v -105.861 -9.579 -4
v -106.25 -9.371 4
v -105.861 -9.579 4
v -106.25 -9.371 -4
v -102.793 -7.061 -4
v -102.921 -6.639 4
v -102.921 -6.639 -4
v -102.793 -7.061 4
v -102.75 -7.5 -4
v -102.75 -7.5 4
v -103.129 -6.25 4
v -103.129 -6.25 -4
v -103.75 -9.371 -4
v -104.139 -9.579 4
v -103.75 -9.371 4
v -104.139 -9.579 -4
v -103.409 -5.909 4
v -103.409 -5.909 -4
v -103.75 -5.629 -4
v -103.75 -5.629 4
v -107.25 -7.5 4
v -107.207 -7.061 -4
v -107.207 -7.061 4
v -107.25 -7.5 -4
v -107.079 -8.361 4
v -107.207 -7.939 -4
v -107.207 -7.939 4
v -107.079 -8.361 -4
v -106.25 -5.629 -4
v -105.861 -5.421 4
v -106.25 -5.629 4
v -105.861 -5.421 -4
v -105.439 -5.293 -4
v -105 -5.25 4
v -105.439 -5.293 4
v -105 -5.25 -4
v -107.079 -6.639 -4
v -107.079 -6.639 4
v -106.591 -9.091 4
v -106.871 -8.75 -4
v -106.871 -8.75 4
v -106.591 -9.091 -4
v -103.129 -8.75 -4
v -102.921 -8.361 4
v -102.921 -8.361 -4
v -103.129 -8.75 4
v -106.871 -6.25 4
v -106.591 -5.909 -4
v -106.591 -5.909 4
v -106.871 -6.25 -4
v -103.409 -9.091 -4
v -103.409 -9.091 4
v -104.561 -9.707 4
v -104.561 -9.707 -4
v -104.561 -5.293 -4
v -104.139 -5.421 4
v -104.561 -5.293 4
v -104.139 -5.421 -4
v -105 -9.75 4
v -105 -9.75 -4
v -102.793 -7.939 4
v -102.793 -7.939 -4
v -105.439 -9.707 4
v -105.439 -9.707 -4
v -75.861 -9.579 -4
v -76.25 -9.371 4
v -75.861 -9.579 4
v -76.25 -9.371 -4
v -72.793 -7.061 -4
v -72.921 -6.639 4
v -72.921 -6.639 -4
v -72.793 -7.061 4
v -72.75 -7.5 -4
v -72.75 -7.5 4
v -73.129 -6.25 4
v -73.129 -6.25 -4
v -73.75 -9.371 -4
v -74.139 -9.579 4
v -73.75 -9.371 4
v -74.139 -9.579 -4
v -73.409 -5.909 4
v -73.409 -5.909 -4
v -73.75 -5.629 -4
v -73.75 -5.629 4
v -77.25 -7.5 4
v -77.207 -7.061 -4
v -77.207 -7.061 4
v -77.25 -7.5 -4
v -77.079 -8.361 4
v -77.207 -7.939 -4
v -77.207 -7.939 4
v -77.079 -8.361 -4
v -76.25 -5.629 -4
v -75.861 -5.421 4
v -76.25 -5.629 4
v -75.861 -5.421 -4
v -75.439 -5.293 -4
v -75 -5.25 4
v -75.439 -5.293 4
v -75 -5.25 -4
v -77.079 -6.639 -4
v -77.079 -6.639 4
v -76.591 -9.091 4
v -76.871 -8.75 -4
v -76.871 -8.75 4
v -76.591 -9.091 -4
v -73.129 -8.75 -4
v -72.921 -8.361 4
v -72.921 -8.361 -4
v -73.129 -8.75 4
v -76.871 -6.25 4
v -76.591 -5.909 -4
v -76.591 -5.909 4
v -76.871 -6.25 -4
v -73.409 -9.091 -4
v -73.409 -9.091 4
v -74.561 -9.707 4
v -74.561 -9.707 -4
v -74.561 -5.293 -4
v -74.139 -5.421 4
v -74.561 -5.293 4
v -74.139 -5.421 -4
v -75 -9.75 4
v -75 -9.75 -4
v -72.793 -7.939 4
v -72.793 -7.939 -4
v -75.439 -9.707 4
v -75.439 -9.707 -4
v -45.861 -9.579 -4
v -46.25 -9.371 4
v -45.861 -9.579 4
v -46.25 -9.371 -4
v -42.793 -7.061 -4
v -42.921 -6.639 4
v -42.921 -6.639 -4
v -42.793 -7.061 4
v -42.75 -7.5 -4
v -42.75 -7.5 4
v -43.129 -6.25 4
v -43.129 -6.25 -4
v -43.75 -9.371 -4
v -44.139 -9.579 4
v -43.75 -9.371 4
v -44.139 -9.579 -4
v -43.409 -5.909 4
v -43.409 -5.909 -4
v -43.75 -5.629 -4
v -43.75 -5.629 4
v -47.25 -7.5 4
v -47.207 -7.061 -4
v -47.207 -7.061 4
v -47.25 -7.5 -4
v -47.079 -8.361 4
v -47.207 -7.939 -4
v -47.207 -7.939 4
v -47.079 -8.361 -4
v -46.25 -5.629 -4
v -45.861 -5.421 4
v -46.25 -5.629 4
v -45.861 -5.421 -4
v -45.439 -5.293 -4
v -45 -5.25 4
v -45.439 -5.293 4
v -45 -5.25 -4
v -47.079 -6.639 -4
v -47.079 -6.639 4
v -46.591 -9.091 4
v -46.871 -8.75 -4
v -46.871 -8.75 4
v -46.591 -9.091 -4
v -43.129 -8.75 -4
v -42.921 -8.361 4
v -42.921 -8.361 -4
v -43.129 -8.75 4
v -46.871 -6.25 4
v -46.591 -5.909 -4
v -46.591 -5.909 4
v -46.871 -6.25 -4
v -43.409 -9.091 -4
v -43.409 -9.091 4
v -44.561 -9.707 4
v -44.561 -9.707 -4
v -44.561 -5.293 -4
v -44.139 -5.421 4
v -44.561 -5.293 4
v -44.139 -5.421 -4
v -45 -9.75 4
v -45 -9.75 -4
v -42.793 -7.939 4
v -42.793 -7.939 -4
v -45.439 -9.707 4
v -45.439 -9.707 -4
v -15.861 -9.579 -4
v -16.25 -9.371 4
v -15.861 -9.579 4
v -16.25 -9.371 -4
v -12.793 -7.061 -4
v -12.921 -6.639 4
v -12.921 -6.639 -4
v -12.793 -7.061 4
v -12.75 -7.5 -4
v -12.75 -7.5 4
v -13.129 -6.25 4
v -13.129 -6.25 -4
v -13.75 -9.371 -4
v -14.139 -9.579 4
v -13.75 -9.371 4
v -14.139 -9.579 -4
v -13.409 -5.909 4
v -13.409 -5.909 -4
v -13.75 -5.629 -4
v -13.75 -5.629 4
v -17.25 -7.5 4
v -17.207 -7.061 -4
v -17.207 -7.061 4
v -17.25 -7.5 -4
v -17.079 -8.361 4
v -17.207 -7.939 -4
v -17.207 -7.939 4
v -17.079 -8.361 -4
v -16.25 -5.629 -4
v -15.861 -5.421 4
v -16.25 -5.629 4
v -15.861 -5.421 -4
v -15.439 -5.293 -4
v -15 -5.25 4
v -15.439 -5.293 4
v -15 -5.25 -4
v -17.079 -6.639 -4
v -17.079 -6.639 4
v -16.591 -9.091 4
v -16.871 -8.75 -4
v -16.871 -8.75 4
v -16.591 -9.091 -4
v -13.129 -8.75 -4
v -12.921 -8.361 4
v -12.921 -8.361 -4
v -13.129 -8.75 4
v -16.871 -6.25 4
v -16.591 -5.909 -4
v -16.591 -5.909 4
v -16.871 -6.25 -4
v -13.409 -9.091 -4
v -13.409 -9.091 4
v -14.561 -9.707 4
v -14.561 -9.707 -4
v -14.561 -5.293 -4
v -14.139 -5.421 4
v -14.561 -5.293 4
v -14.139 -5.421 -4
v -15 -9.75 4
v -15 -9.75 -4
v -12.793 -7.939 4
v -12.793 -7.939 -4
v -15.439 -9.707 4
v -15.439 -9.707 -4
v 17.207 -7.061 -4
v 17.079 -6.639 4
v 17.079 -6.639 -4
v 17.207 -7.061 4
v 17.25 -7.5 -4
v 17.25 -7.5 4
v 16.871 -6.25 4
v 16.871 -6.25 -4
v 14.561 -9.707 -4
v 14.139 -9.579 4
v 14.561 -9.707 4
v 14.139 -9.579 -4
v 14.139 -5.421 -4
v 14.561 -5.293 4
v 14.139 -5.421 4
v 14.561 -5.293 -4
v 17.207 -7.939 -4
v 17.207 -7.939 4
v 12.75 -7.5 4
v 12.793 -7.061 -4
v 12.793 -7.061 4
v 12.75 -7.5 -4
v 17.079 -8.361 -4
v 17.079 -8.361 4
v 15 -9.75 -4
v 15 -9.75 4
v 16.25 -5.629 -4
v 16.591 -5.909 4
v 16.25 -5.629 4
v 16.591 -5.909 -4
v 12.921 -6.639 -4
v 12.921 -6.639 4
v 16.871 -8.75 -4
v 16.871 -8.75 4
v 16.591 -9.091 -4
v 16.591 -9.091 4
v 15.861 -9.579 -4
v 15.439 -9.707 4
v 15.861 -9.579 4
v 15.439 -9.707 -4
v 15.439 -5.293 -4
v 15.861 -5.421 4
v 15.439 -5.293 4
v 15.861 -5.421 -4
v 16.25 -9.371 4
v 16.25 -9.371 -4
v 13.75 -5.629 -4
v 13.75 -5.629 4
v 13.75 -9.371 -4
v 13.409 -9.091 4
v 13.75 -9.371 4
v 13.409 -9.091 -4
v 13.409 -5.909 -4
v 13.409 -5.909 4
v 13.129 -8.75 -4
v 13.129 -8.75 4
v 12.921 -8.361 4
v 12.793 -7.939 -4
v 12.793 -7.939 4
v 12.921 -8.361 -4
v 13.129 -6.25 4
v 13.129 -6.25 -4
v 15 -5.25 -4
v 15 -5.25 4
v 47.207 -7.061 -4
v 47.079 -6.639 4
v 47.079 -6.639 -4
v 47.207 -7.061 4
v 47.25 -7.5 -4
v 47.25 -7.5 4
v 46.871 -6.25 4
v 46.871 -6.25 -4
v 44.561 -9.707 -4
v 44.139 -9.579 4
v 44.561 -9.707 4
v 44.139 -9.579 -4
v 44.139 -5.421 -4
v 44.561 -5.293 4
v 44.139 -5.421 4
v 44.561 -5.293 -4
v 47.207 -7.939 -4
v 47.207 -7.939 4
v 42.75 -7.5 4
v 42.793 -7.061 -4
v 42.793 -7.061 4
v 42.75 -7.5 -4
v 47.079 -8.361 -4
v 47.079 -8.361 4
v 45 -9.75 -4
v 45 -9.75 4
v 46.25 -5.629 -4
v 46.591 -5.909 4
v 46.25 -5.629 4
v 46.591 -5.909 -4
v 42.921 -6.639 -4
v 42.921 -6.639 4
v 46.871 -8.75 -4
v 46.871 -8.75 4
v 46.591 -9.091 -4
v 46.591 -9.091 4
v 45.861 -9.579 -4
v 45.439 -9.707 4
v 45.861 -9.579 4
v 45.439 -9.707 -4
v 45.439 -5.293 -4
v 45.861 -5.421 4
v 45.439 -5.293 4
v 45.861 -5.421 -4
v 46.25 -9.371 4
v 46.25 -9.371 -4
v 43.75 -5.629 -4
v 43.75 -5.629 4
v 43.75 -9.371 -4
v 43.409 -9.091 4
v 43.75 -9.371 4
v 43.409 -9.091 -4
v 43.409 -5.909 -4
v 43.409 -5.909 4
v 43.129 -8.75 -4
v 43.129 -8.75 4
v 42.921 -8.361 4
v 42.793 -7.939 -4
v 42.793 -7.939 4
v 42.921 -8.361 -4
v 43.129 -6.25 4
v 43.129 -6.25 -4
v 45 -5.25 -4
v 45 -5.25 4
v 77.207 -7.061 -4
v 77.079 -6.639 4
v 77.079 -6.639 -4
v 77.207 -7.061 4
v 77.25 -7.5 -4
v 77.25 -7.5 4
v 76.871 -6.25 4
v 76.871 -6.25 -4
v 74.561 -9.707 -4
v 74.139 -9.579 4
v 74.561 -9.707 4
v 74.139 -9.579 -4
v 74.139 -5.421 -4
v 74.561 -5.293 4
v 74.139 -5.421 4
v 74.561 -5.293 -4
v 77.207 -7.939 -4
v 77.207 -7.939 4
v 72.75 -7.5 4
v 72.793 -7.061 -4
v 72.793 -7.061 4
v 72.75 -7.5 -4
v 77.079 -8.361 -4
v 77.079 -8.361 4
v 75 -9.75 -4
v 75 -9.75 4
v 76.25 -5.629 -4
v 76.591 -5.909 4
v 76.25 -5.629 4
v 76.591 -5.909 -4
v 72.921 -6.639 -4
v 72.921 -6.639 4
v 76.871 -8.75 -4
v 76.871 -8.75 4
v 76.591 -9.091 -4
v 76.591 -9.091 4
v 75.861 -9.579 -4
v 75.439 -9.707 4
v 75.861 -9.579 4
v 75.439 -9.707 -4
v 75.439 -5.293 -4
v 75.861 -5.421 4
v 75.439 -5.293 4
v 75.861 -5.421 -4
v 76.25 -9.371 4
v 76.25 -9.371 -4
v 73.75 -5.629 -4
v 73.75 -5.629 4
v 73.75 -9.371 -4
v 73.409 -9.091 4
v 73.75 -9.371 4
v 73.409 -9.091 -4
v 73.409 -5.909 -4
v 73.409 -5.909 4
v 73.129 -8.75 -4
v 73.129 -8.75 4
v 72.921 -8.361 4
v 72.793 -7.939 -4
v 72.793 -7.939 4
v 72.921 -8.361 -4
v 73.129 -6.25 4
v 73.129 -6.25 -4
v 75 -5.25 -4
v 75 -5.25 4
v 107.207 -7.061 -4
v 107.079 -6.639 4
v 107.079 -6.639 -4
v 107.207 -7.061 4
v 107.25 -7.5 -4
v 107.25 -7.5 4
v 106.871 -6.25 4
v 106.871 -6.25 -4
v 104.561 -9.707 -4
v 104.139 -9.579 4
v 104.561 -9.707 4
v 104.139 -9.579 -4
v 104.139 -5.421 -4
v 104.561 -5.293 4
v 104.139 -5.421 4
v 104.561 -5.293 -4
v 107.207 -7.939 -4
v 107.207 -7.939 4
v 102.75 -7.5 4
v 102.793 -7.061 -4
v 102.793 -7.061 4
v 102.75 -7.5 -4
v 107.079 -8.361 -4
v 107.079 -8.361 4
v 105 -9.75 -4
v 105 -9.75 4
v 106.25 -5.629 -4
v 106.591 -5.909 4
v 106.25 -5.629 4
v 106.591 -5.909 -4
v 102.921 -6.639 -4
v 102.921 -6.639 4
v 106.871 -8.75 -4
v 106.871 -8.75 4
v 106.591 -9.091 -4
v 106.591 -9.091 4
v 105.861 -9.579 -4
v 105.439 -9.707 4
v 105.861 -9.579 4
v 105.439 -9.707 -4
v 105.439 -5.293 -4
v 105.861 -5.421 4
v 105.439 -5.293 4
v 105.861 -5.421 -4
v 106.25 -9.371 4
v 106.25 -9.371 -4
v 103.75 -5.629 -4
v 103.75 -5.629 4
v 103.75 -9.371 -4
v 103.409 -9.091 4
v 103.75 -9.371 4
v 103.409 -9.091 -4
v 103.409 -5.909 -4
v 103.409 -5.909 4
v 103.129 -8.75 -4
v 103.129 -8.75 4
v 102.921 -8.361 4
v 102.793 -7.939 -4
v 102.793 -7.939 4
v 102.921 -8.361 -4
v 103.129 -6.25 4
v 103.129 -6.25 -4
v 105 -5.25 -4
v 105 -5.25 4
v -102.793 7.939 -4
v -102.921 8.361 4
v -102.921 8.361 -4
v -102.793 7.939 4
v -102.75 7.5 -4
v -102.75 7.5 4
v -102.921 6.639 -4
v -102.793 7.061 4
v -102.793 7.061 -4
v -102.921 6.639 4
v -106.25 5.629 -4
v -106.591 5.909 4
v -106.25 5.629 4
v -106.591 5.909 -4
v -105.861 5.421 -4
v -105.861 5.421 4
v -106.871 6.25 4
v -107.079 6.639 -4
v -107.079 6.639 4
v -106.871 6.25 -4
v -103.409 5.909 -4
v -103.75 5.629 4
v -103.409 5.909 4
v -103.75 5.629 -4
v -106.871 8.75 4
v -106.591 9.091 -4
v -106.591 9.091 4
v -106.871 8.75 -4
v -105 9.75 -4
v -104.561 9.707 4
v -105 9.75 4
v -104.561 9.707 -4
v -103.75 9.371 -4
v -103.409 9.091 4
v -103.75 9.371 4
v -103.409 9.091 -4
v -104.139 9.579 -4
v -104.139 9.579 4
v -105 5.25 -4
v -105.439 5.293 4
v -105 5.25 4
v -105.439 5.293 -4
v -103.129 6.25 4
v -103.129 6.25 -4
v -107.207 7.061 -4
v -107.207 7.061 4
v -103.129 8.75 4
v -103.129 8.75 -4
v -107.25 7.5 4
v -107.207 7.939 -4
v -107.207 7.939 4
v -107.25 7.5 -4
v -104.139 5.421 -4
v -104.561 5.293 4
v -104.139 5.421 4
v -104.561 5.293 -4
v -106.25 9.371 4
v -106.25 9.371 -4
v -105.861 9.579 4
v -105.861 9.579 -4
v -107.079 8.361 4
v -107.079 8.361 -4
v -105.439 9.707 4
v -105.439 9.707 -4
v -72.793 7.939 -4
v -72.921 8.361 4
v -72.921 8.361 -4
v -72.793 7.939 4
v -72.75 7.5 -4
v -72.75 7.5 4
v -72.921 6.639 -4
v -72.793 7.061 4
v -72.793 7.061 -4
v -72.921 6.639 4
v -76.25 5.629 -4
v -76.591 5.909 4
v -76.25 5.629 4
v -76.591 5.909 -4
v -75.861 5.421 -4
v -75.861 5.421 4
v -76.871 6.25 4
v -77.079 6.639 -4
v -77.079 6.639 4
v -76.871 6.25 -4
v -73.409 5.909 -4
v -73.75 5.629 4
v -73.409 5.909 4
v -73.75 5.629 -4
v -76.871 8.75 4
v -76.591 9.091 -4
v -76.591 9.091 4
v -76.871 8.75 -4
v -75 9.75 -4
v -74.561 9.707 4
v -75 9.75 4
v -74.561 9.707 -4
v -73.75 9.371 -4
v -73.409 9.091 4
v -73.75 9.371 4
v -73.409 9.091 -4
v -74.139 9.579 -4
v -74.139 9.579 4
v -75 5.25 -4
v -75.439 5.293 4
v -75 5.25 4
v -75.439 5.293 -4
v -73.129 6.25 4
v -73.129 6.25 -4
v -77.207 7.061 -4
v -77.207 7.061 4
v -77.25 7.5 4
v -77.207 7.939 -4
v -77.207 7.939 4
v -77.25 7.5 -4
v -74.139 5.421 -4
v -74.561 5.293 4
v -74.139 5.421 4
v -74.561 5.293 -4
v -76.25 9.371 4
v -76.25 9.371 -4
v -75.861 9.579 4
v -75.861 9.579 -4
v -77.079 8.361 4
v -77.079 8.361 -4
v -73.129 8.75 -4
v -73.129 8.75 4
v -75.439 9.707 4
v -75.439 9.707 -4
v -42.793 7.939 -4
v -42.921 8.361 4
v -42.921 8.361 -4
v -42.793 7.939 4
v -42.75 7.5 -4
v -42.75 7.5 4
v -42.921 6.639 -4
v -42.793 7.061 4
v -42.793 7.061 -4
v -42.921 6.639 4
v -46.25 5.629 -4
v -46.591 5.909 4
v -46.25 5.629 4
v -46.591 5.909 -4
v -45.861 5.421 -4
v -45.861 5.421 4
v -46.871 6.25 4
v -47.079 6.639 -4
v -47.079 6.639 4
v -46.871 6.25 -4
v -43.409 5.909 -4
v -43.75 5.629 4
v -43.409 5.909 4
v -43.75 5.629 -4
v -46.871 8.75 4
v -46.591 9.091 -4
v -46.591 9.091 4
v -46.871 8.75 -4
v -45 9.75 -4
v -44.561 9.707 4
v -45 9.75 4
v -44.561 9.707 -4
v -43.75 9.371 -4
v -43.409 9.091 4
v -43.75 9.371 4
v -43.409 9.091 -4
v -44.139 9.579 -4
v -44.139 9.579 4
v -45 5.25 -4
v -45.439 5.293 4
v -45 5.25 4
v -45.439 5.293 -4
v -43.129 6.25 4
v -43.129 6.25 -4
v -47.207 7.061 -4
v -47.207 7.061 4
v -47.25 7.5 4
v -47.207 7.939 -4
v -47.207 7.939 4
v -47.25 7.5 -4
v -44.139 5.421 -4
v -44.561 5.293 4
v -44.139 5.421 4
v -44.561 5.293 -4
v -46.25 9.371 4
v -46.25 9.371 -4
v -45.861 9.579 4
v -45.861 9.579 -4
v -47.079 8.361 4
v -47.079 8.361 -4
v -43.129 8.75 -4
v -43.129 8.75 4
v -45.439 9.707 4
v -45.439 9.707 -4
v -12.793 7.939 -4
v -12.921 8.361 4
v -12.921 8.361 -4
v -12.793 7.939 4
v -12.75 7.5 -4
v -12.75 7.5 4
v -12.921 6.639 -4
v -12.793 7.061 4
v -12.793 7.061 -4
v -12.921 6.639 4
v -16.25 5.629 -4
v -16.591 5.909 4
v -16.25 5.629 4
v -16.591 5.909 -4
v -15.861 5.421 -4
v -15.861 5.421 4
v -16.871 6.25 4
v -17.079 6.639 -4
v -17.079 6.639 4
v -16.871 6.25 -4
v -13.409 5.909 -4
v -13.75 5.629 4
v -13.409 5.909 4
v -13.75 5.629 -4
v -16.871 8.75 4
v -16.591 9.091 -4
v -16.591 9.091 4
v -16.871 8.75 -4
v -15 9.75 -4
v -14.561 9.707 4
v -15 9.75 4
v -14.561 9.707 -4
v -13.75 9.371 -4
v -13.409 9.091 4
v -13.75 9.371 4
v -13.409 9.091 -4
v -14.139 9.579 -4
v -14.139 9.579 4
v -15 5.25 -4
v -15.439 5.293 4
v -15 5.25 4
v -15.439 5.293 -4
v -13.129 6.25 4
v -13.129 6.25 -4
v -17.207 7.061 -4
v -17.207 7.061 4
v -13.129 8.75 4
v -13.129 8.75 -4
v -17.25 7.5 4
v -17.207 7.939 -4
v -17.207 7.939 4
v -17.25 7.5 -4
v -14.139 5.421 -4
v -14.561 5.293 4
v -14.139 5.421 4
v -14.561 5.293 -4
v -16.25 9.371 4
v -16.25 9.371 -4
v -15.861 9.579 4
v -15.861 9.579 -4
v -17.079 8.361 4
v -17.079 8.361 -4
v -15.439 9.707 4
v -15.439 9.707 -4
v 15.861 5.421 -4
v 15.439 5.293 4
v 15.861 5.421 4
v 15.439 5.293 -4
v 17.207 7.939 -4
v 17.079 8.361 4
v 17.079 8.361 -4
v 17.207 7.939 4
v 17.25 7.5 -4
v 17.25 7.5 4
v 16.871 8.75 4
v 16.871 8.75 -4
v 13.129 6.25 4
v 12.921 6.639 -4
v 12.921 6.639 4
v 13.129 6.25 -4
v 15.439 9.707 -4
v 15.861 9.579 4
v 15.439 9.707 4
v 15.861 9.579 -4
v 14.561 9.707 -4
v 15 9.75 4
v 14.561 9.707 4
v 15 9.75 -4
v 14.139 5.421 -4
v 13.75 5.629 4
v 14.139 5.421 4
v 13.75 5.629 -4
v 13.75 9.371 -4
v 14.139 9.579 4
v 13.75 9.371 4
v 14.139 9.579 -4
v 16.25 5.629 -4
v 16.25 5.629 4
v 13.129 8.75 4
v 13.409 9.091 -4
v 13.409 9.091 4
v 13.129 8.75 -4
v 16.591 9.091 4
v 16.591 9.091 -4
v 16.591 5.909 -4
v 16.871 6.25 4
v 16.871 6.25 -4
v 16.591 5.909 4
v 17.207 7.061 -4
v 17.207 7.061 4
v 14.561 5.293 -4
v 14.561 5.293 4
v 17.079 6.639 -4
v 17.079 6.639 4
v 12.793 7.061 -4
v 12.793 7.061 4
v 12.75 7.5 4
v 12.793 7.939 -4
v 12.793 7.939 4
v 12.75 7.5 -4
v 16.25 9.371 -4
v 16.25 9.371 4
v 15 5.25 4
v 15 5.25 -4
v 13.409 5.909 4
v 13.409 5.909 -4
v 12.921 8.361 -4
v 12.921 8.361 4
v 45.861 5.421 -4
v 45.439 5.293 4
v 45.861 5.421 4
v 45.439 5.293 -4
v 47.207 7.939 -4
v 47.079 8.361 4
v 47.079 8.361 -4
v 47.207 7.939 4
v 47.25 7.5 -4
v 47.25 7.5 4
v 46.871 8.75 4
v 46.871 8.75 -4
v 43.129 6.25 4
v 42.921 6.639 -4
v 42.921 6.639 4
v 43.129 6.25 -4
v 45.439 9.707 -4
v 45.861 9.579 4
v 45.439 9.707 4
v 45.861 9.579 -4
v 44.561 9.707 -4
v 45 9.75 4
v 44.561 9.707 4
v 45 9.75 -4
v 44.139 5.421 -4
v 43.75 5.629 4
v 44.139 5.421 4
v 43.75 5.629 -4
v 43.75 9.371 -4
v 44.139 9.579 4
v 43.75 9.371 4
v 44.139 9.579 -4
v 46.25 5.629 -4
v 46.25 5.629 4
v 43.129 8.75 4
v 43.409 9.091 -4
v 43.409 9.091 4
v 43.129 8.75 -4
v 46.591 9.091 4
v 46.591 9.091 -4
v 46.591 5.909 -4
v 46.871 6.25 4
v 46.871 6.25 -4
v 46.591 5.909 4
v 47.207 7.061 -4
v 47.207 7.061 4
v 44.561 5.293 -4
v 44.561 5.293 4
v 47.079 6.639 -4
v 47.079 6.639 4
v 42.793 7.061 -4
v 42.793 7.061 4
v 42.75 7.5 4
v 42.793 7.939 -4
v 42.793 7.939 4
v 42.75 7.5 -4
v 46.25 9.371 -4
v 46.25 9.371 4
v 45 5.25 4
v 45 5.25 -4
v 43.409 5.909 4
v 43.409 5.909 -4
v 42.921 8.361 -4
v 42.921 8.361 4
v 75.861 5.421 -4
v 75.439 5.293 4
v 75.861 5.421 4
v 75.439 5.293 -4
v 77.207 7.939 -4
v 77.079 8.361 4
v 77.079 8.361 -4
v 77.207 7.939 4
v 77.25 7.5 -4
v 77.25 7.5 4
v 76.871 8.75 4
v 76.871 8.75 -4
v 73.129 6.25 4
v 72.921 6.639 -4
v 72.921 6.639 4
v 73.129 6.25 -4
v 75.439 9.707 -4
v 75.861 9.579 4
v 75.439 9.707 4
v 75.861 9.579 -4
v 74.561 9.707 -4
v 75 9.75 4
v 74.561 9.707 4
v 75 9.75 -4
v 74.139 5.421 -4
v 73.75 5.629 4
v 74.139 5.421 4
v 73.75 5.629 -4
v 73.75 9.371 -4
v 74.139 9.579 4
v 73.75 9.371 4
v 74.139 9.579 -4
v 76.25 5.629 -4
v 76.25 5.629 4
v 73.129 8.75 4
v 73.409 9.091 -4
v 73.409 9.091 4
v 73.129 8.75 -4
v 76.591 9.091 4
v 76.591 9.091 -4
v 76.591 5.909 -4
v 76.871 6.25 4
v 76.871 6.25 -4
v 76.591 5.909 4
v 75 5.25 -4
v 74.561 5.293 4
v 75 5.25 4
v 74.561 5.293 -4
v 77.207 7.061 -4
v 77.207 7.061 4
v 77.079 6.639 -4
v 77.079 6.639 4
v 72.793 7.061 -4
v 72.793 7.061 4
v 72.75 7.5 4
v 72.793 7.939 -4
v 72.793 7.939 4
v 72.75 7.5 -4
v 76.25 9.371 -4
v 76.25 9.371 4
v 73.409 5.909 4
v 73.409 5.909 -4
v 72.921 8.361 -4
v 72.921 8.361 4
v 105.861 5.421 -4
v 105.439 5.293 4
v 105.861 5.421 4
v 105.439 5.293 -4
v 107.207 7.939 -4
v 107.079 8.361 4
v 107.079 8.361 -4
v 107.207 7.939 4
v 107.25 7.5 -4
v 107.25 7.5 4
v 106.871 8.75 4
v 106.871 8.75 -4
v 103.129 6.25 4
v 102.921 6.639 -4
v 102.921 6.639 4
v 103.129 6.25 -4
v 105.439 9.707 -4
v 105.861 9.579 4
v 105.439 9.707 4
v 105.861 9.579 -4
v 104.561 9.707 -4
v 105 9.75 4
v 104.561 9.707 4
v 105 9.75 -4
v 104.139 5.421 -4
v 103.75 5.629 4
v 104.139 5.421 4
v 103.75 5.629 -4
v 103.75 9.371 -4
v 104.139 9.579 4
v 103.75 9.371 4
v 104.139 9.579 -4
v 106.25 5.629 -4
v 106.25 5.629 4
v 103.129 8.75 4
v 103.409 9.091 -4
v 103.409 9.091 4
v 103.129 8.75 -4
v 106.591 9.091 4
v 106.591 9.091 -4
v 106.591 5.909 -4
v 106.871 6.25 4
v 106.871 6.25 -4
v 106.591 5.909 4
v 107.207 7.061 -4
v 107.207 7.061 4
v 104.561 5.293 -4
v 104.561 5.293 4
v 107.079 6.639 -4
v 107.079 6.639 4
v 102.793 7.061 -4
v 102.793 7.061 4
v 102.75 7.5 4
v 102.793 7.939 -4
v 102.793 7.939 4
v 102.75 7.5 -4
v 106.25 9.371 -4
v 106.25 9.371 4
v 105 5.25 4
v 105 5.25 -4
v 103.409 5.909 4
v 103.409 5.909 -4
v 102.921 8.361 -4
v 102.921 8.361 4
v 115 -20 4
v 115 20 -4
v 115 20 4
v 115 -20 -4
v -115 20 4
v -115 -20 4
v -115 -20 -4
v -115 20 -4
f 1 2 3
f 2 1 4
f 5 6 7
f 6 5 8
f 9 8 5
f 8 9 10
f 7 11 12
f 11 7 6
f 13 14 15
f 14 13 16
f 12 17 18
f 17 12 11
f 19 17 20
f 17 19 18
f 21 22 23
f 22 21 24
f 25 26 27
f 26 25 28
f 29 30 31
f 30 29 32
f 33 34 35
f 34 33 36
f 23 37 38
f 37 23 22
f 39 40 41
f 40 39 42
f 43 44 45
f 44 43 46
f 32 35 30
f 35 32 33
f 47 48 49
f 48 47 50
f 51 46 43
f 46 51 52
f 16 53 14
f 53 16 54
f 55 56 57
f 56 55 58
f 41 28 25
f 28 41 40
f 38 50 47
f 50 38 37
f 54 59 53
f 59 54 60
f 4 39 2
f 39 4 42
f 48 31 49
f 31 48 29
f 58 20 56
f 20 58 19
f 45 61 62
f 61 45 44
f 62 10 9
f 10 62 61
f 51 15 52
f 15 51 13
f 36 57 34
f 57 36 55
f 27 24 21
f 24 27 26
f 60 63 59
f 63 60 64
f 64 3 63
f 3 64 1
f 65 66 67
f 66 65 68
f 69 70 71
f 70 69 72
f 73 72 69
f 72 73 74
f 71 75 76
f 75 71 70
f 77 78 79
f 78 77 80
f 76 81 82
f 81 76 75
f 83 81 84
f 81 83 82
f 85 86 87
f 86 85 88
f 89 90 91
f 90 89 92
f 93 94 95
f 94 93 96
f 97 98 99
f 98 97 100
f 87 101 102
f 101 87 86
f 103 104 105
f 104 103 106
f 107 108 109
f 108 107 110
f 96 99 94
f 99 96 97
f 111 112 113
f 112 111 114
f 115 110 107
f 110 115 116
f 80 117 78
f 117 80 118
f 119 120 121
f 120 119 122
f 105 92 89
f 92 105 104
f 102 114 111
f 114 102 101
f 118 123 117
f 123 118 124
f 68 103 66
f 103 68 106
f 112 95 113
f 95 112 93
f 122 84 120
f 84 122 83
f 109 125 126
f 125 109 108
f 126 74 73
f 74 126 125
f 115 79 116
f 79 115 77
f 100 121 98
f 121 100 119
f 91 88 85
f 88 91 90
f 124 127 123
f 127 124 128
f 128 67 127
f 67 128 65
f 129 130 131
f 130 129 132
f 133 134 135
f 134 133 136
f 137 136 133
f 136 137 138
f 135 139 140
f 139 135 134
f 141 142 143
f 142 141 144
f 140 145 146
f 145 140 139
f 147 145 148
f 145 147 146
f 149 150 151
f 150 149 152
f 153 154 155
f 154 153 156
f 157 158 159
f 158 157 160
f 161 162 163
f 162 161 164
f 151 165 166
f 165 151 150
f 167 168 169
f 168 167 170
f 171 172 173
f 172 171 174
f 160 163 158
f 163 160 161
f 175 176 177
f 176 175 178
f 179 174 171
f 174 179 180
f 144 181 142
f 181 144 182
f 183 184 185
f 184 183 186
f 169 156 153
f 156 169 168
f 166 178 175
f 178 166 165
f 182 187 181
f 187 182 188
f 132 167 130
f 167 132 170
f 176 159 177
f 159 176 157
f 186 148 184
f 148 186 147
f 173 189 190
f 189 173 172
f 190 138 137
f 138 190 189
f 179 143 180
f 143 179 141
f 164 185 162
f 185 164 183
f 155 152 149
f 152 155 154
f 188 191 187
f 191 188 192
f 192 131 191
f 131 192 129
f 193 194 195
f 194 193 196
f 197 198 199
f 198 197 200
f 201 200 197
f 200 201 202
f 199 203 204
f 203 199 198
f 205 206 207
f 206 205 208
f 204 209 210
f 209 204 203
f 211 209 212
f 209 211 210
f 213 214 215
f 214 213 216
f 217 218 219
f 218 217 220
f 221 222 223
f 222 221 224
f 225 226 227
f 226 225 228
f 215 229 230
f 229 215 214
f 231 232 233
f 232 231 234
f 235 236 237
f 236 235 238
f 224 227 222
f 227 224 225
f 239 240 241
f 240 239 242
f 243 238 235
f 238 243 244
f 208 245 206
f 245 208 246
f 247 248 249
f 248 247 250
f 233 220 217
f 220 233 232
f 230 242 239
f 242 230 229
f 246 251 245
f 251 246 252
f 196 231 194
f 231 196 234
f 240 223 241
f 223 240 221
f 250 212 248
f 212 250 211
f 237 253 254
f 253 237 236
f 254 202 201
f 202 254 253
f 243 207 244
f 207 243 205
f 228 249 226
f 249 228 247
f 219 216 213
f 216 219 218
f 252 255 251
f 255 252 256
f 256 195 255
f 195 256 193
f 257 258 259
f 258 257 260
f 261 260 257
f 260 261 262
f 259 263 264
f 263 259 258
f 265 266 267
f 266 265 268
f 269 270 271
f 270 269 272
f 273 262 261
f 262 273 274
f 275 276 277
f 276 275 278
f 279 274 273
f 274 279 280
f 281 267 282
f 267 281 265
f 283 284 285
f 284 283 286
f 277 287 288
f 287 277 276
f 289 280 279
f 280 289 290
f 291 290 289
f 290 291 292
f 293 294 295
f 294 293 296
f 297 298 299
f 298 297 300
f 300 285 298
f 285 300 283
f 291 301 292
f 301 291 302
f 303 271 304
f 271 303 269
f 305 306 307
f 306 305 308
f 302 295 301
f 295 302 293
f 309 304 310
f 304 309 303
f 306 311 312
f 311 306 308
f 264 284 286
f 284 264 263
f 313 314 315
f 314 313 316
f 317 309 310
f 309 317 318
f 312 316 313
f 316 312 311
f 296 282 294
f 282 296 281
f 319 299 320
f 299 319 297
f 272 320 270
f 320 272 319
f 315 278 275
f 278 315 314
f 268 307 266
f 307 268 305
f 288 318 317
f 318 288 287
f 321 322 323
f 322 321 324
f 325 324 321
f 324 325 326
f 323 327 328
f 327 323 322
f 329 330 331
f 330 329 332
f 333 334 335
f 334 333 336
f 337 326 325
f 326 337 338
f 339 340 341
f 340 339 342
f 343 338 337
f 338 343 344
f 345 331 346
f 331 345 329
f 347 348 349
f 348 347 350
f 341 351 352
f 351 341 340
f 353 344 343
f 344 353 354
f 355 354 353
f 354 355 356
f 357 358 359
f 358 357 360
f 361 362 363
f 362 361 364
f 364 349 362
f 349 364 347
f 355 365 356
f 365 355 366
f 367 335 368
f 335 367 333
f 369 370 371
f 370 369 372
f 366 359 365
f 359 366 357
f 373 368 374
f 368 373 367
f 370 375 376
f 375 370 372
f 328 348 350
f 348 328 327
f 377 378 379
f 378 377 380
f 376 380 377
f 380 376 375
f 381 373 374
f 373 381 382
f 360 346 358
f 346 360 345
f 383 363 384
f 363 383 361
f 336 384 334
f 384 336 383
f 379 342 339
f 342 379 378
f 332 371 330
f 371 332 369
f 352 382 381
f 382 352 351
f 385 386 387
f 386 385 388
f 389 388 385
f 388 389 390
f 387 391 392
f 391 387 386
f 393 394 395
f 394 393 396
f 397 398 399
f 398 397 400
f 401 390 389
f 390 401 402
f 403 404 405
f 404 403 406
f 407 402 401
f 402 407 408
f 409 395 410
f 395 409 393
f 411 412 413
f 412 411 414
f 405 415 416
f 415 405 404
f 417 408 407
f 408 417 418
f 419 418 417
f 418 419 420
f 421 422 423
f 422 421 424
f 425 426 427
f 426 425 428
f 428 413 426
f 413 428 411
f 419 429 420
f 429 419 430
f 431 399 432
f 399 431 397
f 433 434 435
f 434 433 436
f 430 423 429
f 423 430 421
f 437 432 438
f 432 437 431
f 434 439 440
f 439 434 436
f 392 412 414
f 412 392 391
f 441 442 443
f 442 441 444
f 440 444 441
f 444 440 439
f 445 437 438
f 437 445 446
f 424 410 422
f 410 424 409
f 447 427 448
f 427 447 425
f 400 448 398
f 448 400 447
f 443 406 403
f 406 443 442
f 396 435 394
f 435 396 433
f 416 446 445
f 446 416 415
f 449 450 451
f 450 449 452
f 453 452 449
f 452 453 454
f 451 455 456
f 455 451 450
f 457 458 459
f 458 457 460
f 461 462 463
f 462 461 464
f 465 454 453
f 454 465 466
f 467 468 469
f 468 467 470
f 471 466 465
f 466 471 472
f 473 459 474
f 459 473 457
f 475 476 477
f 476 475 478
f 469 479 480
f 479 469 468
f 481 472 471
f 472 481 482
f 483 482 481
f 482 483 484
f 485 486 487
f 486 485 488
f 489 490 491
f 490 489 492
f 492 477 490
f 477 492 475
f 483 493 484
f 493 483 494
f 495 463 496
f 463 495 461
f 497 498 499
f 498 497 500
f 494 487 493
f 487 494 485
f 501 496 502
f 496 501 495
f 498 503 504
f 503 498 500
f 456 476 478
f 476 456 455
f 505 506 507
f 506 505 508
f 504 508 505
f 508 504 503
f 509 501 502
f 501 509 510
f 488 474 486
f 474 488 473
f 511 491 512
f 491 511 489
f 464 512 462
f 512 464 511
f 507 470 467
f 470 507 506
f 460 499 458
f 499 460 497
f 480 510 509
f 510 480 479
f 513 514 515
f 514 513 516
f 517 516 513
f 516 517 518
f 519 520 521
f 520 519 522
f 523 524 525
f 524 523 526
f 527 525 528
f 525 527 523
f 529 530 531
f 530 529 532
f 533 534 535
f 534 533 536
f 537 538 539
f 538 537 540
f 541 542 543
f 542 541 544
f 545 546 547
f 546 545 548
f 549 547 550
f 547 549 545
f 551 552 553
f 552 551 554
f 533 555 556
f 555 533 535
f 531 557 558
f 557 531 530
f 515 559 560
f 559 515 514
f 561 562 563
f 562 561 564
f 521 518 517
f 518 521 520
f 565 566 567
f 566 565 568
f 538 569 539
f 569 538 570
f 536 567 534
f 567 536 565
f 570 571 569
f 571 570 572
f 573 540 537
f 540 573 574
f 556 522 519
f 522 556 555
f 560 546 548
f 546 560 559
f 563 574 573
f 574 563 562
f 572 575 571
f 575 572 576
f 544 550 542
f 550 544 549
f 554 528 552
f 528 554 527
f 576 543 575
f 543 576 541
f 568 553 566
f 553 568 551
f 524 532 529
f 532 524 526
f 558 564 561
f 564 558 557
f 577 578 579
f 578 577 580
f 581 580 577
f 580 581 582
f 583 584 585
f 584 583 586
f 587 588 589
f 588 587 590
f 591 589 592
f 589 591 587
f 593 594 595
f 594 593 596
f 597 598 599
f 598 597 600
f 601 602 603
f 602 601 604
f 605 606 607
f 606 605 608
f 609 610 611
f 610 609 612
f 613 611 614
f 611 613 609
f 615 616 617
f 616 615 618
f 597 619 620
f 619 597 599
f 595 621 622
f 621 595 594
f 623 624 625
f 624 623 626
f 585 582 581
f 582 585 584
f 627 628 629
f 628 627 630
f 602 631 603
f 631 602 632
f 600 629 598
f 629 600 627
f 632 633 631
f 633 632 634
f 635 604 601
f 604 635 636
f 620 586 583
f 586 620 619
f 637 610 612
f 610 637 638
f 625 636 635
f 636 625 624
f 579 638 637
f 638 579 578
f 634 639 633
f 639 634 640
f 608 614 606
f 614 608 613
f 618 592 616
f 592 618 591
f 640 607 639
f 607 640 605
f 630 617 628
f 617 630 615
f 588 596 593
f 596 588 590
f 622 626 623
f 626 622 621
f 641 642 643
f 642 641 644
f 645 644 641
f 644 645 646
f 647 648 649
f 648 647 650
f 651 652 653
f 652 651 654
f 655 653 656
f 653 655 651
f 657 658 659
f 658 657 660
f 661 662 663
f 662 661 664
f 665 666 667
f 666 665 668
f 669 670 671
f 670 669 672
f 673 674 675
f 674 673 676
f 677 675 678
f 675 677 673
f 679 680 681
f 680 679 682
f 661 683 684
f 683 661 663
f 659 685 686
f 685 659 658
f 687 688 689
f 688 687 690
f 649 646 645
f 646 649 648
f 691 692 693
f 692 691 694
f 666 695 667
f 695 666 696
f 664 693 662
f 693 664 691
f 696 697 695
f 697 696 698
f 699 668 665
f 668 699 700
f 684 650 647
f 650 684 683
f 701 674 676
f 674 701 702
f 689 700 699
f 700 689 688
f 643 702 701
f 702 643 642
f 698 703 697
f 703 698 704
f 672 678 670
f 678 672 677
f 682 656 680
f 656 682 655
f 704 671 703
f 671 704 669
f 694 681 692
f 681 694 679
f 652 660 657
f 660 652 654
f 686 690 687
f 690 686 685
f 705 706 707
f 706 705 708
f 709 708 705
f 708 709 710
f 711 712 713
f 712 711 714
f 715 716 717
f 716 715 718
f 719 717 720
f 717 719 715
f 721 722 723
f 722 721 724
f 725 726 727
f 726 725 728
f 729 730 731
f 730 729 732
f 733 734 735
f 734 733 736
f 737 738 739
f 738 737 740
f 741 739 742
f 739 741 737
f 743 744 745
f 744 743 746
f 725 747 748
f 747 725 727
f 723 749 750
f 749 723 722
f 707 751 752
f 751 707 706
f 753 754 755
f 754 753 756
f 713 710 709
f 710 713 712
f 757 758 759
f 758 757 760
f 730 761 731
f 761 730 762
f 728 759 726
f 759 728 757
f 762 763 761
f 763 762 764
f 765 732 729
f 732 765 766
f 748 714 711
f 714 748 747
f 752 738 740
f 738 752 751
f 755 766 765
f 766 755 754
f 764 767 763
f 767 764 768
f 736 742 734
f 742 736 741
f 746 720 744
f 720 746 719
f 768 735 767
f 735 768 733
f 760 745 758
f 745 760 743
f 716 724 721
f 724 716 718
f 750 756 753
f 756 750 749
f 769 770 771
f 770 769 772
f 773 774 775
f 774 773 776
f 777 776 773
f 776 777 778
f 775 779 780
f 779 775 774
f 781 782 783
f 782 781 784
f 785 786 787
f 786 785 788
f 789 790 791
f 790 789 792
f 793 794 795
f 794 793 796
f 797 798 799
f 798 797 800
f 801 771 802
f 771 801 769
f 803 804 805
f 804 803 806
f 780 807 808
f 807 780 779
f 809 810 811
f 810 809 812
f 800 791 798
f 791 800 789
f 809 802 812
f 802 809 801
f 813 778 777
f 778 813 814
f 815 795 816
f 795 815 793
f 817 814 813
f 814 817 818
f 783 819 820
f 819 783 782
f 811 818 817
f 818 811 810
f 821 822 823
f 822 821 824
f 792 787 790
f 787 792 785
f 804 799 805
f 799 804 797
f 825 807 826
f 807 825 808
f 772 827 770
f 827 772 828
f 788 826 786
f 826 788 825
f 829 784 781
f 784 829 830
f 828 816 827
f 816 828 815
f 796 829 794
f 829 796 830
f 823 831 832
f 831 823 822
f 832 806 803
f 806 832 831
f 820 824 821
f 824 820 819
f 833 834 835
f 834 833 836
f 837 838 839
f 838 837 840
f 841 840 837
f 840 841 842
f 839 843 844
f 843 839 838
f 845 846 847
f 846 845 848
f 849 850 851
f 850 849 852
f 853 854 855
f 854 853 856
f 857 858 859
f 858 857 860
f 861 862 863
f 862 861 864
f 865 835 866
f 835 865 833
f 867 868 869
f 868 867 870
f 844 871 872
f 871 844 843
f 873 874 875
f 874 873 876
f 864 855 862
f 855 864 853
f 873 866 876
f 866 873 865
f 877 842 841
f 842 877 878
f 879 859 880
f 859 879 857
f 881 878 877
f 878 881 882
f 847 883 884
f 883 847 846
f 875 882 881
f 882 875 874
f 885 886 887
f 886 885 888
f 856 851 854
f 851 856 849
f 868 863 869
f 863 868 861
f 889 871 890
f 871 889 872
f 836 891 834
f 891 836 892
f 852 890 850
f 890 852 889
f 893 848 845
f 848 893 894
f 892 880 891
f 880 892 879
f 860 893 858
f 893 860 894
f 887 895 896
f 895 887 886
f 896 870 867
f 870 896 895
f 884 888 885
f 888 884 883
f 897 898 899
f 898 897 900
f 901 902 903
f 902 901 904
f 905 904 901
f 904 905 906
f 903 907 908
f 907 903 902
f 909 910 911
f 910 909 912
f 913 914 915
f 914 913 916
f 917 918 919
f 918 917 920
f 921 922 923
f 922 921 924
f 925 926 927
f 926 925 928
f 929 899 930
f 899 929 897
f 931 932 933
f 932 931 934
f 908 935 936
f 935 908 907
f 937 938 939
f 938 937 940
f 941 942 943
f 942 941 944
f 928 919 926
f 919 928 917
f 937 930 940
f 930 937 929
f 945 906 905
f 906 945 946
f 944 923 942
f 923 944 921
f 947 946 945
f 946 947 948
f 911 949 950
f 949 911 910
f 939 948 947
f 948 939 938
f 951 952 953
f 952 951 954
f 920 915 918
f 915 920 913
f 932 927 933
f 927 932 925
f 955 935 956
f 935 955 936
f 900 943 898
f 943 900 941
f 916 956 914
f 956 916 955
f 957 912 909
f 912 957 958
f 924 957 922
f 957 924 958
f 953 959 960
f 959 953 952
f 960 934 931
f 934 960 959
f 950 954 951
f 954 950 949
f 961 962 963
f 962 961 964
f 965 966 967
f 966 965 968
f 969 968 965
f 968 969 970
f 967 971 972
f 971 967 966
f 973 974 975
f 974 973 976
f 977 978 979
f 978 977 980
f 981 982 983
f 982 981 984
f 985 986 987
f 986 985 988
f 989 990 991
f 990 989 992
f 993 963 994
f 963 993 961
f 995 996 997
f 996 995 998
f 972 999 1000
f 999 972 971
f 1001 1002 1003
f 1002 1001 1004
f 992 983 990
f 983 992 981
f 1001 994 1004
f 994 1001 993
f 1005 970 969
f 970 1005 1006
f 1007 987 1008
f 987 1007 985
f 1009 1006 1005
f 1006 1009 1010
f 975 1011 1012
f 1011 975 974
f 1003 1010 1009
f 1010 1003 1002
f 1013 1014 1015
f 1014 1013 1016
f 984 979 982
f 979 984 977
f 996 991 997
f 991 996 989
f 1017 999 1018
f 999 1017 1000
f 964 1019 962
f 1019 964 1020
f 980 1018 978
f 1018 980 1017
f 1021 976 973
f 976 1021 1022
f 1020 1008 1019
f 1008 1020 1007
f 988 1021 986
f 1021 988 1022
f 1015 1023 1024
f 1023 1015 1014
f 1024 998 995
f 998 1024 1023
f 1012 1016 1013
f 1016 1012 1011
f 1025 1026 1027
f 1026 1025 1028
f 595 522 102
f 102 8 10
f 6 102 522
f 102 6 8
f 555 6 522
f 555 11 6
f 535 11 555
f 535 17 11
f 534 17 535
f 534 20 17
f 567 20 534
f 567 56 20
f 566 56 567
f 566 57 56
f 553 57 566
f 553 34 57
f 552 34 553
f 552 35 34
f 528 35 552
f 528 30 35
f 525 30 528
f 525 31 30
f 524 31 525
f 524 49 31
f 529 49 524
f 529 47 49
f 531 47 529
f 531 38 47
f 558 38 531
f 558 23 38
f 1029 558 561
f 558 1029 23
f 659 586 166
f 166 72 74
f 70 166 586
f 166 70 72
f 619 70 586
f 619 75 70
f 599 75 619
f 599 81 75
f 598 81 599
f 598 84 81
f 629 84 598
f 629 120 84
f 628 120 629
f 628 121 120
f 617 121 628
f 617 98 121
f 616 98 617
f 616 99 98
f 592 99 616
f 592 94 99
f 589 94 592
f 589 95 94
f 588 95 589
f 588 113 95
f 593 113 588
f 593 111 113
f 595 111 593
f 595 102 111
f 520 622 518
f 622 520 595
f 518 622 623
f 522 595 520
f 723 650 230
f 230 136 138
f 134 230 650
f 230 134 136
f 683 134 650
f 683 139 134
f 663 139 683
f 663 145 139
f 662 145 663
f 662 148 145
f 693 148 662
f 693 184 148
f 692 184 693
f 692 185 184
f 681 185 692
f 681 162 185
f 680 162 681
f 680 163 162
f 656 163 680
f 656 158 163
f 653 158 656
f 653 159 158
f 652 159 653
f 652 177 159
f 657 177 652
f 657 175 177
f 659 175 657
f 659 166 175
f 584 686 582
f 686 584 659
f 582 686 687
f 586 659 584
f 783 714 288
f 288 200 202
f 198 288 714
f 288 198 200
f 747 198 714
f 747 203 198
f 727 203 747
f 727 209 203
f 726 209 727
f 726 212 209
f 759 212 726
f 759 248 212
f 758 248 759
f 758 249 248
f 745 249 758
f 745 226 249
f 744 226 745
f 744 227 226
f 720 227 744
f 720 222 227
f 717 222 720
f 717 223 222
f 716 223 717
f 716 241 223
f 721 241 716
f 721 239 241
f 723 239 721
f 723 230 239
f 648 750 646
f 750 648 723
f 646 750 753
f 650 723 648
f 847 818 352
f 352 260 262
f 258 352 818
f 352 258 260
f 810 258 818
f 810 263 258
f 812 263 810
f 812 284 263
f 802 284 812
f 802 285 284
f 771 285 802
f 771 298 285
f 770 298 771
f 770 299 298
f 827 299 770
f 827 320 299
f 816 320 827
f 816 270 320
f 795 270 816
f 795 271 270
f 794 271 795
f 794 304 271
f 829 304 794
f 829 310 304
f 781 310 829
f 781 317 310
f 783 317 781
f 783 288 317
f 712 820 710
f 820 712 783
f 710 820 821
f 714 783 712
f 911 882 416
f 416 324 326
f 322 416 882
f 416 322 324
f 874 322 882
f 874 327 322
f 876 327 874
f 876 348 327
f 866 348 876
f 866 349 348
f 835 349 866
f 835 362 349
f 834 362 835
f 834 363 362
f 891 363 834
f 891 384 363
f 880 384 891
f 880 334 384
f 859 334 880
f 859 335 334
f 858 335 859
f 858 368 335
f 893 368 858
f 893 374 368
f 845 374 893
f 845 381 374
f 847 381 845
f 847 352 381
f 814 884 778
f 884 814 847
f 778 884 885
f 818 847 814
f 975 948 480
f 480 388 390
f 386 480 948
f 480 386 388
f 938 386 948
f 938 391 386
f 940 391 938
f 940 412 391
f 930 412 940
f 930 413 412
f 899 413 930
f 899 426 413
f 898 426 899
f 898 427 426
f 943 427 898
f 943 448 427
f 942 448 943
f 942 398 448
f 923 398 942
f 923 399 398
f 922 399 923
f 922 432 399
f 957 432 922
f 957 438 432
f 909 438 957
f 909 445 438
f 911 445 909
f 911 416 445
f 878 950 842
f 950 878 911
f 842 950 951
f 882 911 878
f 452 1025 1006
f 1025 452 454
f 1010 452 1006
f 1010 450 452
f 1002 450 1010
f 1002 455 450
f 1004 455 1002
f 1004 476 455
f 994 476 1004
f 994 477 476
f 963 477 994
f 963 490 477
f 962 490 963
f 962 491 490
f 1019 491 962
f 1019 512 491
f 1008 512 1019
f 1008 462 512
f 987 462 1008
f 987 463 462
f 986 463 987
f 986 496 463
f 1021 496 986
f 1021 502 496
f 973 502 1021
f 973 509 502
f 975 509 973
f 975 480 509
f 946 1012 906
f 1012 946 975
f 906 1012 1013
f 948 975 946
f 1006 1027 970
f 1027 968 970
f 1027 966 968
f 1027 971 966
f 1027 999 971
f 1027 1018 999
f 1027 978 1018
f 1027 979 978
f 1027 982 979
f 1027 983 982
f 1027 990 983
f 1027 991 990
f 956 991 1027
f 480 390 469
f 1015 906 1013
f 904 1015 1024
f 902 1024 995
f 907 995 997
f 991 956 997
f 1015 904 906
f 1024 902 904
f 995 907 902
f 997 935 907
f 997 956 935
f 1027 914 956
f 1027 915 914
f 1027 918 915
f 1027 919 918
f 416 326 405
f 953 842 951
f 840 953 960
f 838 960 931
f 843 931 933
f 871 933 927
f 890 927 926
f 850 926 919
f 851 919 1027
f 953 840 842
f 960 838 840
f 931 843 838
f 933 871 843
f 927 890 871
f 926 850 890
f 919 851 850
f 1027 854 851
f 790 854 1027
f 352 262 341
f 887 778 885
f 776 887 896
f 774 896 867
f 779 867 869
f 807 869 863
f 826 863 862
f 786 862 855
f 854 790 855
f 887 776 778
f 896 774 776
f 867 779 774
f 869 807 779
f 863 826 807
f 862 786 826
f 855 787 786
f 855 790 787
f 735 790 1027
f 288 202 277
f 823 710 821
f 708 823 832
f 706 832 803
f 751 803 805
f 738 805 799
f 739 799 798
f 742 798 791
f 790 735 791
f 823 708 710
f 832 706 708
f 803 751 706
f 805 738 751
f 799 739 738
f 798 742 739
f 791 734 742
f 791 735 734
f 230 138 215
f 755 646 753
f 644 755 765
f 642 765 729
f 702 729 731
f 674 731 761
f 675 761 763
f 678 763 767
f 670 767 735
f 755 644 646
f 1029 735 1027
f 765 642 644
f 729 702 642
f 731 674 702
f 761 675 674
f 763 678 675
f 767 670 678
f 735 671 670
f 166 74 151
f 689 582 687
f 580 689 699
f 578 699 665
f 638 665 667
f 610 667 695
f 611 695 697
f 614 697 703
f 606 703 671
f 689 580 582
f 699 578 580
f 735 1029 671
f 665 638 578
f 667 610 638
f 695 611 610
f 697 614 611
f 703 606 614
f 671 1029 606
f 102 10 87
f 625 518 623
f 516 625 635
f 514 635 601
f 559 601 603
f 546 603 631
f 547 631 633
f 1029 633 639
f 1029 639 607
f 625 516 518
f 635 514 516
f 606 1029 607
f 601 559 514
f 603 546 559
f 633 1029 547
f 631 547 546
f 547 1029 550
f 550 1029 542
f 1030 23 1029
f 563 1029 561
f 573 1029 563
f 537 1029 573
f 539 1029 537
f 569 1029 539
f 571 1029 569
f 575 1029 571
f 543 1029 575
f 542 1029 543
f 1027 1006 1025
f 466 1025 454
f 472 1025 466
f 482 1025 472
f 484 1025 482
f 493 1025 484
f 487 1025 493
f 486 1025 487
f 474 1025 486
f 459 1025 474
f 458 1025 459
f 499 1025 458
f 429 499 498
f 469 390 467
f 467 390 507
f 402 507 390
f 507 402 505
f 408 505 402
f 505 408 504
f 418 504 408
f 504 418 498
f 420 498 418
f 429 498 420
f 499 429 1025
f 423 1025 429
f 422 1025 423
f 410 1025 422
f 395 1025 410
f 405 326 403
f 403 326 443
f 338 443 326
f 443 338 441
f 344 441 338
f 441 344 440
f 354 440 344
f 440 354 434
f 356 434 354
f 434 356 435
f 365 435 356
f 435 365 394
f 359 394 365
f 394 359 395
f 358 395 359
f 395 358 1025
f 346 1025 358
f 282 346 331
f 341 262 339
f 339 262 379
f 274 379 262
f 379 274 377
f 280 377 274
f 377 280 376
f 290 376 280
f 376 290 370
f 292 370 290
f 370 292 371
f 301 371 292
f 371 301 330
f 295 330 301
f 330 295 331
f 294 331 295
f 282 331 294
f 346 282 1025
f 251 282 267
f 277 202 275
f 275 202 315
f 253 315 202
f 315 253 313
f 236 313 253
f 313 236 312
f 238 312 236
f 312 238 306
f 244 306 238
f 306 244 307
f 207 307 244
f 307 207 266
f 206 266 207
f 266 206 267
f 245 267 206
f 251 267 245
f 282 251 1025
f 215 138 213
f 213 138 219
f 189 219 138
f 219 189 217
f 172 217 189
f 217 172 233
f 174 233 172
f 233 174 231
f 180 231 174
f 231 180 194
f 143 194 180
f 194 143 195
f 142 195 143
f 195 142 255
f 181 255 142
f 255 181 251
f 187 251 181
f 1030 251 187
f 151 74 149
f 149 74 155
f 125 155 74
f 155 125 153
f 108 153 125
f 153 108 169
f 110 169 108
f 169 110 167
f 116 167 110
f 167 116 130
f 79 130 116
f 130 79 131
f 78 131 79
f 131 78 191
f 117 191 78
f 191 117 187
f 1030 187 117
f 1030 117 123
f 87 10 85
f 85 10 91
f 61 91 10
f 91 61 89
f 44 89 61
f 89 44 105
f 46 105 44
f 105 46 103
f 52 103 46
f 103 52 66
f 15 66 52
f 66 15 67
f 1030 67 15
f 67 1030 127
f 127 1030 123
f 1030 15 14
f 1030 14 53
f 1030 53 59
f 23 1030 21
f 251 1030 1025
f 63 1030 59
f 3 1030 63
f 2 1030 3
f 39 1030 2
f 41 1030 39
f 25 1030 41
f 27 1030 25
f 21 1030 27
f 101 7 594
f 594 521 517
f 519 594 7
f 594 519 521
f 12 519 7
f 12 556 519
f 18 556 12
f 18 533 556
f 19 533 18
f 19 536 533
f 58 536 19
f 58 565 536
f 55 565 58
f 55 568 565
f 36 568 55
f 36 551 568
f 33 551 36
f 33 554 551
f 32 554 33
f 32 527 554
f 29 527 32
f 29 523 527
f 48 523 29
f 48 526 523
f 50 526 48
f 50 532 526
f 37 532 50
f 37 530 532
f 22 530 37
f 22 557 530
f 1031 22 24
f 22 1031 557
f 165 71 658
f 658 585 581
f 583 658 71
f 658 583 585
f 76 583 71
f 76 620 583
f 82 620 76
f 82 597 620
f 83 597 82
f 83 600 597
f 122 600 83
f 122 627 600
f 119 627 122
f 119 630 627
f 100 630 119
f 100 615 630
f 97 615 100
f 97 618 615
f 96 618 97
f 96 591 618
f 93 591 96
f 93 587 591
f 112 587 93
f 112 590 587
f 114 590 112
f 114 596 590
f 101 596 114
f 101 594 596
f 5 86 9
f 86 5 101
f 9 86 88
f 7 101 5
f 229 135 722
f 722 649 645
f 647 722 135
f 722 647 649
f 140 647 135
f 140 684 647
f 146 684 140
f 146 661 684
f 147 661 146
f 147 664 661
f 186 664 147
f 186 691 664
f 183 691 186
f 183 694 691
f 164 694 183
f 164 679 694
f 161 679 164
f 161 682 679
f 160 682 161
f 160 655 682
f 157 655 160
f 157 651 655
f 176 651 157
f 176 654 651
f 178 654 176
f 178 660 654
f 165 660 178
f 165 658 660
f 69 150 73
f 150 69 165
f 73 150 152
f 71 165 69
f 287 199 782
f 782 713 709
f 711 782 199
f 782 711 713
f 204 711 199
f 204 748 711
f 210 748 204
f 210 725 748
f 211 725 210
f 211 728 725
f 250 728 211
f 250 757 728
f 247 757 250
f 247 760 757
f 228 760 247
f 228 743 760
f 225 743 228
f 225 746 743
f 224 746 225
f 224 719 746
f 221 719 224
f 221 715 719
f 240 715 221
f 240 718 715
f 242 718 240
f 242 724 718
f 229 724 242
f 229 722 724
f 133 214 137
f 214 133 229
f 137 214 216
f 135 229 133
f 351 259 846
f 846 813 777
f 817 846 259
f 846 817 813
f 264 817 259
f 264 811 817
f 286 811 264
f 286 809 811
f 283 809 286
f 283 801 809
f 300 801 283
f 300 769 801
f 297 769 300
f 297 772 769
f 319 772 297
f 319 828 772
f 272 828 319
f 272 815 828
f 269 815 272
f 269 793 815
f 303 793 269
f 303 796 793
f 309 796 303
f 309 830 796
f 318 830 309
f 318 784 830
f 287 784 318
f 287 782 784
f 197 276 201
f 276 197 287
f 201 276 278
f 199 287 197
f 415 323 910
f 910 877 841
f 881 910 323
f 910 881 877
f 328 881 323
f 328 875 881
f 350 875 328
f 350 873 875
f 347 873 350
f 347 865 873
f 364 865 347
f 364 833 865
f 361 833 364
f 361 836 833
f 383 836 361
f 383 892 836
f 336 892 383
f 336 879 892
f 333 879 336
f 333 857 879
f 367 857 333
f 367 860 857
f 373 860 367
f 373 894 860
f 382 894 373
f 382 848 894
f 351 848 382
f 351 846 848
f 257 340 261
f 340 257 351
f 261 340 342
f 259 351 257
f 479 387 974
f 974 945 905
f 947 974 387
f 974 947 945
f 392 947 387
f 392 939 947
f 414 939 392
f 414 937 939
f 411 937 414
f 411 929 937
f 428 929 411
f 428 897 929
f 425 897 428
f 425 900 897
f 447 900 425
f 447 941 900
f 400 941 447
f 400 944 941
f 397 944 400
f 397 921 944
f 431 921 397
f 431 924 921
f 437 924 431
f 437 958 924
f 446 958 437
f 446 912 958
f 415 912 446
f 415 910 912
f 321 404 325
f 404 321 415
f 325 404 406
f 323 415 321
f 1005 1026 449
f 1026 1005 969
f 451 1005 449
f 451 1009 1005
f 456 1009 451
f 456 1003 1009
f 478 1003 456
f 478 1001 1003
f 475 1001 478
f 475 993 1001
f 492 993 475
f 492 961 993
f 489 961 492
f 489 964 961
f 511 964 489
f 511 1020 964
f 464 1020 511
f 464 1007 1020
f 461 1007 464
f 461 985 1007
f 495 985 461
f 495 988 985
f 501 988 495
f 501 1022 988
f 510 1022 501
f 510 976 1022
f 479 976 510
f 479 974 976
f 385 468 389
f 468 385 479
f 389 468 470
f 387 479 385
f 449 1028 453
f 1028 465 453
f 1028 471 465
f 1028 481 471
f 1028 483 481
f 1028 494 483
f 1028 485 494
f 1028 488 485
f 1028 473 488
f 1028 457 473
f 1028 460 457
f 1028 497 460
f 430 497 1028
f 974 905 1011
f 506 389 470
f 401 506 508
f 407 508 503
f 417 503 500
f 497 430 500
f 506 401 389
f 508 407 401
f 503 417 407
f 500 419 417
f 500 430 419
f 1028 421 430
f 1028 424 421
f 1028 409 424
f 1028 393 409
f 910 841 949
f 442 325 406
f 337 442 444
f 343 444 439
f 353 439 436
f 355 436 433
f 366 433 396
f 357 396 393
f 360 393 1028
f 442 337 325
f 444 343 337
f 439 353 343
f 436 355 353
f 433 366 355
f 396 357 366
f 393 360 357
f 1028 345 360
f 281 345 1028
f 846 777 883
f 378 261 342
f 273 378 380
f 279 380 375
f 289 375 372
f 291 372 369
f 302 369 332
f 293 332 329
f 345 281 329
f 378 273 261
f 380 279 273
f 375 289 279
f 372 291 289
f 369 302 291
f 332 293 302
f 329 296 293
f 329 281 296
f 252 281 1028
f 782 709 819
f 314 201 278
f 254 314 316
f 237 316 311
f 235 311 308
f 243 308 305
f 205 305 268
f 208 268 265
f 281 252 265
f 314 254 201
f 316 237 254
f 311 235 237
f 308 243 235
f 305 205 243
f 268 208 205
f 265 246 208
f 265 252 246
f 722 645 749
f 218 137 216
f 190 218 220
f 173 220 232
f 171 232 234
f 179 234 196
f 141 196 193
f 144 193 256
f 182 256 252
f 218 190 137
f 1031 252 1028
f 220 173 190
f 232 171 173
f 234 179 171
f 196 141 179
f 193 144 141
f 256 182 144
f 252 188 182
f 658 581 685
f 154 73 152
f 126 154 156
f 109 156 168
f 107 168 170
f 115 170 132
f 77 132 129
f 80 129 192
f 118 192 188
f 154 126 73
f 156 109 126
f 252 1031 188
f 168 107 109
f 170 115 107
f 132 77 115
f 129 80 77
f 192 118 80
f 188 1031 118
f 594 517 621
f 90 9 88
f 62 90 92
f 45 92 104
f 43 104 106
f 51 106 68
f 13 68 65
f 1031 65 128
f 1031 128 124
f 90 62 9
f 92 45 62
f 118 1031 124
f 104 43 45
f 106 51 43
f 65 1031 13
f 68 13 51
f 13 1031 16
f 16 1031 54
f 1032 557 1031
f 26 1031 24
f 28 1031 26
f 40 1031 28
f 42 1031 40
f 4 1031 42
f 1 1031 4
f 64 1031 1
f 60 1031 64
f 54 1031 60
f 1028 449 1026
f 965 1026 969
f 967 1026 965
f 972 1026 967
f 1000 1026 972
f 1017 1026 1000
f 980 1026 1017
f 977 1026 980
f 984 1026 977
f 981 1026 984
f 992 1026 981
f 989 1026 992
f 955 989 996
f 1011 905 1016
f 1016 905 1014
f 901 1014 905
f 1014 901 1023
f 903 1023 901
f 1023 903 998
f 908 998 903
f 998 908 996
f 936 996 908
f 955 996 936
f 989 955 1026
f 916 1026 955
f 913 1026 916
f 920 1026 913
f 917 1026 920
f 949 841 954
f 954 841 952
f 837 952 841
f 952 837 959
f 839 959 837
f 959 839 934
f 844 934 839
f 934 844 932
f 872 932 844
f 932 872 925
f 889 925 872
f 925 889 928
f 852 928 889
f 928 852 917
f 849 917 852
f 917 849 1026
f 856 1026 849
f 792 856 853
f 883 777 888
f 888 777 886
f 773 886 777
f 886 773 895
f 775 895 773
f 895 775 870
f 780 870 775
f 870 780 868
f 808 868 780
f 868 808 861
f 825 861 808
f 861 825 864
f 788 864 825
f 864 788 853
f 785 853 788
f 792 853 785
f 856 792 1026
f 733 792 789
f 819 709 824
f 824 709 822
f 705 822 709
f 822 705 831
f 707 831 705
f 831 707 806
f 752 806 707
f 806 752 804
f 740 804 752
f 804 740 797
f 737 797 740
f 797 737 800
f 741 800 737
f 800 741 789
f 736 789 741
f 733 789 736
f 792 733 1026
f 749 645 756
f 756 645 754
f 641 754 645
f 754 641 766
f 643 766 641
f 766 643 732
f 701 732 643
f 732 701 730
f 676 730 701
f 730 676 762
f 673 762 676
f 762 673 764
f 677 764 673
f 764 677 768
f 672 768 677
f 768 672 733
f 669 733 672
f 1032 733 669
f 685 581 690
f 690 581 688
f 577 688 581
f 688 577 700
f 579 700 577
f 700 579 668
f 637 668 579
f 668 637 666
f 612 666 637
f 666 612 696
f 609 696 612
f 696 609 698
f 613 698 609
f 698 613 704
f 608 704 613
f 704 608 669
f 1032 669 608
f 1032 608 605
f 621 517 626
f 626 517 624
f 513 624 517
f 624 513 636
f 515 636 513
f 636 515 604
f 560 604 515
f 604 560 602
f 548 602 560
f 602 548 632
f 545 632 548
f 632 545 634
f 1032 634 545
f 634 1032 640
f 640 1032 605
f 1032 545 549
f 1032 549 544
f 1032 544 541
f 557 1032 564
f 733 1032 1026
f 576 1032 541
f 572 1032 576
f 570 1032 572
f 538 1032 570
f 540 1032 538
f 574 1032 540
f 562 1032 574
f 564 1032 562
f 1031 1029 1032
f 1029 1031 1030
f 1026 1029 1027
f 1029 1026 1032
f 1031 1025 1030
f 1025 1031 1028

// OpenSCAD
$fn = 32;

// ----------------------------------------------------------------------
// Hole bar, 8 x Ø4.5
// tworows layout, 10 mm edge offset
// ----------------------------------------------------------------------

// --- parameters (mm) ---
bar_w = 40;       // bar width (Y)
bar_t = 8;        // bar thickness (Z)
holes = 8;        // holes per row
hole_d = 4.5;     // hole diameter
edge = 10;        // offset from the bar end to the first hole
pitch = 30;       // pitch between neighbouring holes
row_offset = 15;  // distance between the two rows

// --- derived feature positions (mm) ---
span = (holes - 1) * pitch;   // = 210   distance between the end holes
bar_l = span + 2 * edge;      // = 230   overall bar length
start_x = -bar_l / 2 + edge;  // = -105   X of the first hole
feature_centers = [
  [start_x + 0 * pitch, -row_offset / 2],
  [start_x + 1 * pitch, -row_offset / 2],
  [start_x + 2 * pitch, -row_offset / 2],
  [start_x + 3 * pitch, -row_offset / 2],
  [start_x + 4 * pitch, -row_offset / 2],
  [start_x + 5 * pitch, -row_offset / 2],
  [start_x + 6 * pitch, -row_offset / 2],
  [start_x + 7 * pitch, -row_offset / 2]
];   // hole centres of the first row
row2_centers = [
  [start_x + 0 * pitch, row_offset / 2],
  [start_x + 1 * pitch, row_offset / 2],
  [start_x + 2 * pitch, row_offset / 2],
  [start_x + 3 * pitch, row_offset / 2],
  [start_x + 4 * pitch, row_offset / 2],
  [start_x + 5 * pitch, row_offset / 2],
  [start_x + 6 * pitch, row_offset / 2],
  [start_x + 7 * pitch, row_offset / 2]
];   // hole centres of the second row

// bar with two rows of holes, both read from their own centre arrays
difference() {
  translate([-bar_l / 2, -bar_w / 2, -bar_t / 2]) cube([bar_l, bar_w, bar_t]);
  for (centre = feature_centers)
    translate([centre[0], centre[1], 0])
      cylinder(d = hole_d, h = bar_t + 2, center = true);
  for (centre = row2_centers)
    translate([centre[0], centre[1], 0])
      cylinder(d = hole_d, h = bar_t + 2, center = true);
}
